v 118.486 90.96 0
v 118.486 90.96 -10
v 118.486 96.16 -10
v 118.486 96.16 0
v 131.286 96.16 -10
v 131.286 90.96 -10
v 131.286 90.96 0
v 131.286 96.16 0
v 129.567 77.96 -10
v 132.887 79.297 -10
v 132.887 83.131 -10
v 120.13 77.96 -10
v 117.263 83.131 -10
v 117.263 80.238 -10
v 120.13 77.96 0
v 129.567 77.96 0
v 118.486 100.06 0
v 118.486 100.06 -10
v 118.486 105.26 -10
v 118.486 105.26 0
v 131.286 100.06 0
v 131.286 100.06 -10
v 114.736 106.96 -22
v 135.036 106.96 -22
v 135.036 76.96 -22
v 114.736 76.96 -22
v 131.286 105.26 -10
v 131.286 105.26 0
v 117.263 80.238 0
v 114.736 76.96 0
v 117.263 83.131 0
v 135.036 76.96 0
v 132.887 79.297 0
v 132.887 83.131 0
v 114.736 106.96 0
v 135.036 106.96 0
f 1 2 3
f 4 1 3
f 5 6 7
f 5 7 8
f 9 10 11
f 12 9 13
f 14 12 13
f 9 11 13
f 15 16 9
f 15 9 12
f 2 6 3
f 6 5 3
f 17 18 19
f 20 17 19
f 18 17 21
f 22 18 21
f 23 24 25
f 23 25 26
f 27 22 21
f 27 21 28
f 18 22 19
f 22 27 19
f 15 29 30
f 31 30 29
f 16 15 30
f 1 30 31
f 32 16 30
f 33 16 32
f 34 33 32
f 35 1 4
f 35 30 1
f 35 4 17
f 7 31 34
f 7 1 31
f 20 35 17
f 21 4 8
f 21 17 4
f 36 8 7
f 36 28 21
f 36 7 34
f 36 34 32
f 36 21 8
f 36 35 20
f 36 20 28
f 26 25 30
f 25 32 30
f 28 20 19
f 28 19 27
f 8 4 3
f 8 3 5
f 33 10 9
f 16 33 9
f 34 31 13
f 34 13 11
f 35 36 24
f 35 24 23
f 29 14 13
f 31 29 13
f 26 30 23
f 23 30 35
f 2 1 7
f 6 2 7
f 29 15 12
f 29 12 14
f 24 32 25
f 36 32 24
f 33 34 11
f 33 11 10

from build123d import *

# Parameters (mm, degrees)
SKETCH_1_W      = 20.3
SKETCH_1_H      = 30
SKETCH_1_W_2    = 12.8
SKETCH_1_H_2    = 5.2
EXTRUDE_1_DEPTH = 10
SKETCH_2_W      = 20.3
SKETCH_2_H      = 30
EXTRUDE_2_DEPTH = 12


with BuildPart() as part:
    # Эскиз1 → Бобышка-Вытянуть1 (new body)
    with BuildSketch(Plane.XY):
        with Locations((124.886360731, 91.960324966)):
            Rectangle(SKETCH_1_W, SKETCH_1_H)
        with Locations((124.886360731, 93.560324966)):
            Rectangle(SKETCH_1_W_2, SKETCH_1_H_2, mode=Mode.SUBTRACT)
        with Locations((124.886360731, 102.660324966)):
            Rectangle(SKETCH_1_W_2, SKETCH_1_H_2, mode=Mode.SUBTRACT)
        Polygon((129.566618584, 77.960324966), (120.129531537, 77.960324966), (117.26298197, 80.238017172), (117.26298197, 83.13068263), (132.886839219, 83.13068263), (132.886839219, 79.296578456), align=None, mode=Mode.SUBTRACT)
    extrude(amount=-EXTRUDE_1_DEPTH)

    # Эскиз2 → Бобышка-Вытянуть2 (add)
    with BuildSketch(Plane(origin=(0, 0, -10), x_dir=(-1, 0, 0), z_dir=(0, 0, -1))):
        with Locations((-124.886360731, 91.960324966)):
            Rectangle(SKETCH_2_W, SKETCH_2_H)
    extrude(amount=EXTRUDE_2_DEPTH)


solid = part.part
